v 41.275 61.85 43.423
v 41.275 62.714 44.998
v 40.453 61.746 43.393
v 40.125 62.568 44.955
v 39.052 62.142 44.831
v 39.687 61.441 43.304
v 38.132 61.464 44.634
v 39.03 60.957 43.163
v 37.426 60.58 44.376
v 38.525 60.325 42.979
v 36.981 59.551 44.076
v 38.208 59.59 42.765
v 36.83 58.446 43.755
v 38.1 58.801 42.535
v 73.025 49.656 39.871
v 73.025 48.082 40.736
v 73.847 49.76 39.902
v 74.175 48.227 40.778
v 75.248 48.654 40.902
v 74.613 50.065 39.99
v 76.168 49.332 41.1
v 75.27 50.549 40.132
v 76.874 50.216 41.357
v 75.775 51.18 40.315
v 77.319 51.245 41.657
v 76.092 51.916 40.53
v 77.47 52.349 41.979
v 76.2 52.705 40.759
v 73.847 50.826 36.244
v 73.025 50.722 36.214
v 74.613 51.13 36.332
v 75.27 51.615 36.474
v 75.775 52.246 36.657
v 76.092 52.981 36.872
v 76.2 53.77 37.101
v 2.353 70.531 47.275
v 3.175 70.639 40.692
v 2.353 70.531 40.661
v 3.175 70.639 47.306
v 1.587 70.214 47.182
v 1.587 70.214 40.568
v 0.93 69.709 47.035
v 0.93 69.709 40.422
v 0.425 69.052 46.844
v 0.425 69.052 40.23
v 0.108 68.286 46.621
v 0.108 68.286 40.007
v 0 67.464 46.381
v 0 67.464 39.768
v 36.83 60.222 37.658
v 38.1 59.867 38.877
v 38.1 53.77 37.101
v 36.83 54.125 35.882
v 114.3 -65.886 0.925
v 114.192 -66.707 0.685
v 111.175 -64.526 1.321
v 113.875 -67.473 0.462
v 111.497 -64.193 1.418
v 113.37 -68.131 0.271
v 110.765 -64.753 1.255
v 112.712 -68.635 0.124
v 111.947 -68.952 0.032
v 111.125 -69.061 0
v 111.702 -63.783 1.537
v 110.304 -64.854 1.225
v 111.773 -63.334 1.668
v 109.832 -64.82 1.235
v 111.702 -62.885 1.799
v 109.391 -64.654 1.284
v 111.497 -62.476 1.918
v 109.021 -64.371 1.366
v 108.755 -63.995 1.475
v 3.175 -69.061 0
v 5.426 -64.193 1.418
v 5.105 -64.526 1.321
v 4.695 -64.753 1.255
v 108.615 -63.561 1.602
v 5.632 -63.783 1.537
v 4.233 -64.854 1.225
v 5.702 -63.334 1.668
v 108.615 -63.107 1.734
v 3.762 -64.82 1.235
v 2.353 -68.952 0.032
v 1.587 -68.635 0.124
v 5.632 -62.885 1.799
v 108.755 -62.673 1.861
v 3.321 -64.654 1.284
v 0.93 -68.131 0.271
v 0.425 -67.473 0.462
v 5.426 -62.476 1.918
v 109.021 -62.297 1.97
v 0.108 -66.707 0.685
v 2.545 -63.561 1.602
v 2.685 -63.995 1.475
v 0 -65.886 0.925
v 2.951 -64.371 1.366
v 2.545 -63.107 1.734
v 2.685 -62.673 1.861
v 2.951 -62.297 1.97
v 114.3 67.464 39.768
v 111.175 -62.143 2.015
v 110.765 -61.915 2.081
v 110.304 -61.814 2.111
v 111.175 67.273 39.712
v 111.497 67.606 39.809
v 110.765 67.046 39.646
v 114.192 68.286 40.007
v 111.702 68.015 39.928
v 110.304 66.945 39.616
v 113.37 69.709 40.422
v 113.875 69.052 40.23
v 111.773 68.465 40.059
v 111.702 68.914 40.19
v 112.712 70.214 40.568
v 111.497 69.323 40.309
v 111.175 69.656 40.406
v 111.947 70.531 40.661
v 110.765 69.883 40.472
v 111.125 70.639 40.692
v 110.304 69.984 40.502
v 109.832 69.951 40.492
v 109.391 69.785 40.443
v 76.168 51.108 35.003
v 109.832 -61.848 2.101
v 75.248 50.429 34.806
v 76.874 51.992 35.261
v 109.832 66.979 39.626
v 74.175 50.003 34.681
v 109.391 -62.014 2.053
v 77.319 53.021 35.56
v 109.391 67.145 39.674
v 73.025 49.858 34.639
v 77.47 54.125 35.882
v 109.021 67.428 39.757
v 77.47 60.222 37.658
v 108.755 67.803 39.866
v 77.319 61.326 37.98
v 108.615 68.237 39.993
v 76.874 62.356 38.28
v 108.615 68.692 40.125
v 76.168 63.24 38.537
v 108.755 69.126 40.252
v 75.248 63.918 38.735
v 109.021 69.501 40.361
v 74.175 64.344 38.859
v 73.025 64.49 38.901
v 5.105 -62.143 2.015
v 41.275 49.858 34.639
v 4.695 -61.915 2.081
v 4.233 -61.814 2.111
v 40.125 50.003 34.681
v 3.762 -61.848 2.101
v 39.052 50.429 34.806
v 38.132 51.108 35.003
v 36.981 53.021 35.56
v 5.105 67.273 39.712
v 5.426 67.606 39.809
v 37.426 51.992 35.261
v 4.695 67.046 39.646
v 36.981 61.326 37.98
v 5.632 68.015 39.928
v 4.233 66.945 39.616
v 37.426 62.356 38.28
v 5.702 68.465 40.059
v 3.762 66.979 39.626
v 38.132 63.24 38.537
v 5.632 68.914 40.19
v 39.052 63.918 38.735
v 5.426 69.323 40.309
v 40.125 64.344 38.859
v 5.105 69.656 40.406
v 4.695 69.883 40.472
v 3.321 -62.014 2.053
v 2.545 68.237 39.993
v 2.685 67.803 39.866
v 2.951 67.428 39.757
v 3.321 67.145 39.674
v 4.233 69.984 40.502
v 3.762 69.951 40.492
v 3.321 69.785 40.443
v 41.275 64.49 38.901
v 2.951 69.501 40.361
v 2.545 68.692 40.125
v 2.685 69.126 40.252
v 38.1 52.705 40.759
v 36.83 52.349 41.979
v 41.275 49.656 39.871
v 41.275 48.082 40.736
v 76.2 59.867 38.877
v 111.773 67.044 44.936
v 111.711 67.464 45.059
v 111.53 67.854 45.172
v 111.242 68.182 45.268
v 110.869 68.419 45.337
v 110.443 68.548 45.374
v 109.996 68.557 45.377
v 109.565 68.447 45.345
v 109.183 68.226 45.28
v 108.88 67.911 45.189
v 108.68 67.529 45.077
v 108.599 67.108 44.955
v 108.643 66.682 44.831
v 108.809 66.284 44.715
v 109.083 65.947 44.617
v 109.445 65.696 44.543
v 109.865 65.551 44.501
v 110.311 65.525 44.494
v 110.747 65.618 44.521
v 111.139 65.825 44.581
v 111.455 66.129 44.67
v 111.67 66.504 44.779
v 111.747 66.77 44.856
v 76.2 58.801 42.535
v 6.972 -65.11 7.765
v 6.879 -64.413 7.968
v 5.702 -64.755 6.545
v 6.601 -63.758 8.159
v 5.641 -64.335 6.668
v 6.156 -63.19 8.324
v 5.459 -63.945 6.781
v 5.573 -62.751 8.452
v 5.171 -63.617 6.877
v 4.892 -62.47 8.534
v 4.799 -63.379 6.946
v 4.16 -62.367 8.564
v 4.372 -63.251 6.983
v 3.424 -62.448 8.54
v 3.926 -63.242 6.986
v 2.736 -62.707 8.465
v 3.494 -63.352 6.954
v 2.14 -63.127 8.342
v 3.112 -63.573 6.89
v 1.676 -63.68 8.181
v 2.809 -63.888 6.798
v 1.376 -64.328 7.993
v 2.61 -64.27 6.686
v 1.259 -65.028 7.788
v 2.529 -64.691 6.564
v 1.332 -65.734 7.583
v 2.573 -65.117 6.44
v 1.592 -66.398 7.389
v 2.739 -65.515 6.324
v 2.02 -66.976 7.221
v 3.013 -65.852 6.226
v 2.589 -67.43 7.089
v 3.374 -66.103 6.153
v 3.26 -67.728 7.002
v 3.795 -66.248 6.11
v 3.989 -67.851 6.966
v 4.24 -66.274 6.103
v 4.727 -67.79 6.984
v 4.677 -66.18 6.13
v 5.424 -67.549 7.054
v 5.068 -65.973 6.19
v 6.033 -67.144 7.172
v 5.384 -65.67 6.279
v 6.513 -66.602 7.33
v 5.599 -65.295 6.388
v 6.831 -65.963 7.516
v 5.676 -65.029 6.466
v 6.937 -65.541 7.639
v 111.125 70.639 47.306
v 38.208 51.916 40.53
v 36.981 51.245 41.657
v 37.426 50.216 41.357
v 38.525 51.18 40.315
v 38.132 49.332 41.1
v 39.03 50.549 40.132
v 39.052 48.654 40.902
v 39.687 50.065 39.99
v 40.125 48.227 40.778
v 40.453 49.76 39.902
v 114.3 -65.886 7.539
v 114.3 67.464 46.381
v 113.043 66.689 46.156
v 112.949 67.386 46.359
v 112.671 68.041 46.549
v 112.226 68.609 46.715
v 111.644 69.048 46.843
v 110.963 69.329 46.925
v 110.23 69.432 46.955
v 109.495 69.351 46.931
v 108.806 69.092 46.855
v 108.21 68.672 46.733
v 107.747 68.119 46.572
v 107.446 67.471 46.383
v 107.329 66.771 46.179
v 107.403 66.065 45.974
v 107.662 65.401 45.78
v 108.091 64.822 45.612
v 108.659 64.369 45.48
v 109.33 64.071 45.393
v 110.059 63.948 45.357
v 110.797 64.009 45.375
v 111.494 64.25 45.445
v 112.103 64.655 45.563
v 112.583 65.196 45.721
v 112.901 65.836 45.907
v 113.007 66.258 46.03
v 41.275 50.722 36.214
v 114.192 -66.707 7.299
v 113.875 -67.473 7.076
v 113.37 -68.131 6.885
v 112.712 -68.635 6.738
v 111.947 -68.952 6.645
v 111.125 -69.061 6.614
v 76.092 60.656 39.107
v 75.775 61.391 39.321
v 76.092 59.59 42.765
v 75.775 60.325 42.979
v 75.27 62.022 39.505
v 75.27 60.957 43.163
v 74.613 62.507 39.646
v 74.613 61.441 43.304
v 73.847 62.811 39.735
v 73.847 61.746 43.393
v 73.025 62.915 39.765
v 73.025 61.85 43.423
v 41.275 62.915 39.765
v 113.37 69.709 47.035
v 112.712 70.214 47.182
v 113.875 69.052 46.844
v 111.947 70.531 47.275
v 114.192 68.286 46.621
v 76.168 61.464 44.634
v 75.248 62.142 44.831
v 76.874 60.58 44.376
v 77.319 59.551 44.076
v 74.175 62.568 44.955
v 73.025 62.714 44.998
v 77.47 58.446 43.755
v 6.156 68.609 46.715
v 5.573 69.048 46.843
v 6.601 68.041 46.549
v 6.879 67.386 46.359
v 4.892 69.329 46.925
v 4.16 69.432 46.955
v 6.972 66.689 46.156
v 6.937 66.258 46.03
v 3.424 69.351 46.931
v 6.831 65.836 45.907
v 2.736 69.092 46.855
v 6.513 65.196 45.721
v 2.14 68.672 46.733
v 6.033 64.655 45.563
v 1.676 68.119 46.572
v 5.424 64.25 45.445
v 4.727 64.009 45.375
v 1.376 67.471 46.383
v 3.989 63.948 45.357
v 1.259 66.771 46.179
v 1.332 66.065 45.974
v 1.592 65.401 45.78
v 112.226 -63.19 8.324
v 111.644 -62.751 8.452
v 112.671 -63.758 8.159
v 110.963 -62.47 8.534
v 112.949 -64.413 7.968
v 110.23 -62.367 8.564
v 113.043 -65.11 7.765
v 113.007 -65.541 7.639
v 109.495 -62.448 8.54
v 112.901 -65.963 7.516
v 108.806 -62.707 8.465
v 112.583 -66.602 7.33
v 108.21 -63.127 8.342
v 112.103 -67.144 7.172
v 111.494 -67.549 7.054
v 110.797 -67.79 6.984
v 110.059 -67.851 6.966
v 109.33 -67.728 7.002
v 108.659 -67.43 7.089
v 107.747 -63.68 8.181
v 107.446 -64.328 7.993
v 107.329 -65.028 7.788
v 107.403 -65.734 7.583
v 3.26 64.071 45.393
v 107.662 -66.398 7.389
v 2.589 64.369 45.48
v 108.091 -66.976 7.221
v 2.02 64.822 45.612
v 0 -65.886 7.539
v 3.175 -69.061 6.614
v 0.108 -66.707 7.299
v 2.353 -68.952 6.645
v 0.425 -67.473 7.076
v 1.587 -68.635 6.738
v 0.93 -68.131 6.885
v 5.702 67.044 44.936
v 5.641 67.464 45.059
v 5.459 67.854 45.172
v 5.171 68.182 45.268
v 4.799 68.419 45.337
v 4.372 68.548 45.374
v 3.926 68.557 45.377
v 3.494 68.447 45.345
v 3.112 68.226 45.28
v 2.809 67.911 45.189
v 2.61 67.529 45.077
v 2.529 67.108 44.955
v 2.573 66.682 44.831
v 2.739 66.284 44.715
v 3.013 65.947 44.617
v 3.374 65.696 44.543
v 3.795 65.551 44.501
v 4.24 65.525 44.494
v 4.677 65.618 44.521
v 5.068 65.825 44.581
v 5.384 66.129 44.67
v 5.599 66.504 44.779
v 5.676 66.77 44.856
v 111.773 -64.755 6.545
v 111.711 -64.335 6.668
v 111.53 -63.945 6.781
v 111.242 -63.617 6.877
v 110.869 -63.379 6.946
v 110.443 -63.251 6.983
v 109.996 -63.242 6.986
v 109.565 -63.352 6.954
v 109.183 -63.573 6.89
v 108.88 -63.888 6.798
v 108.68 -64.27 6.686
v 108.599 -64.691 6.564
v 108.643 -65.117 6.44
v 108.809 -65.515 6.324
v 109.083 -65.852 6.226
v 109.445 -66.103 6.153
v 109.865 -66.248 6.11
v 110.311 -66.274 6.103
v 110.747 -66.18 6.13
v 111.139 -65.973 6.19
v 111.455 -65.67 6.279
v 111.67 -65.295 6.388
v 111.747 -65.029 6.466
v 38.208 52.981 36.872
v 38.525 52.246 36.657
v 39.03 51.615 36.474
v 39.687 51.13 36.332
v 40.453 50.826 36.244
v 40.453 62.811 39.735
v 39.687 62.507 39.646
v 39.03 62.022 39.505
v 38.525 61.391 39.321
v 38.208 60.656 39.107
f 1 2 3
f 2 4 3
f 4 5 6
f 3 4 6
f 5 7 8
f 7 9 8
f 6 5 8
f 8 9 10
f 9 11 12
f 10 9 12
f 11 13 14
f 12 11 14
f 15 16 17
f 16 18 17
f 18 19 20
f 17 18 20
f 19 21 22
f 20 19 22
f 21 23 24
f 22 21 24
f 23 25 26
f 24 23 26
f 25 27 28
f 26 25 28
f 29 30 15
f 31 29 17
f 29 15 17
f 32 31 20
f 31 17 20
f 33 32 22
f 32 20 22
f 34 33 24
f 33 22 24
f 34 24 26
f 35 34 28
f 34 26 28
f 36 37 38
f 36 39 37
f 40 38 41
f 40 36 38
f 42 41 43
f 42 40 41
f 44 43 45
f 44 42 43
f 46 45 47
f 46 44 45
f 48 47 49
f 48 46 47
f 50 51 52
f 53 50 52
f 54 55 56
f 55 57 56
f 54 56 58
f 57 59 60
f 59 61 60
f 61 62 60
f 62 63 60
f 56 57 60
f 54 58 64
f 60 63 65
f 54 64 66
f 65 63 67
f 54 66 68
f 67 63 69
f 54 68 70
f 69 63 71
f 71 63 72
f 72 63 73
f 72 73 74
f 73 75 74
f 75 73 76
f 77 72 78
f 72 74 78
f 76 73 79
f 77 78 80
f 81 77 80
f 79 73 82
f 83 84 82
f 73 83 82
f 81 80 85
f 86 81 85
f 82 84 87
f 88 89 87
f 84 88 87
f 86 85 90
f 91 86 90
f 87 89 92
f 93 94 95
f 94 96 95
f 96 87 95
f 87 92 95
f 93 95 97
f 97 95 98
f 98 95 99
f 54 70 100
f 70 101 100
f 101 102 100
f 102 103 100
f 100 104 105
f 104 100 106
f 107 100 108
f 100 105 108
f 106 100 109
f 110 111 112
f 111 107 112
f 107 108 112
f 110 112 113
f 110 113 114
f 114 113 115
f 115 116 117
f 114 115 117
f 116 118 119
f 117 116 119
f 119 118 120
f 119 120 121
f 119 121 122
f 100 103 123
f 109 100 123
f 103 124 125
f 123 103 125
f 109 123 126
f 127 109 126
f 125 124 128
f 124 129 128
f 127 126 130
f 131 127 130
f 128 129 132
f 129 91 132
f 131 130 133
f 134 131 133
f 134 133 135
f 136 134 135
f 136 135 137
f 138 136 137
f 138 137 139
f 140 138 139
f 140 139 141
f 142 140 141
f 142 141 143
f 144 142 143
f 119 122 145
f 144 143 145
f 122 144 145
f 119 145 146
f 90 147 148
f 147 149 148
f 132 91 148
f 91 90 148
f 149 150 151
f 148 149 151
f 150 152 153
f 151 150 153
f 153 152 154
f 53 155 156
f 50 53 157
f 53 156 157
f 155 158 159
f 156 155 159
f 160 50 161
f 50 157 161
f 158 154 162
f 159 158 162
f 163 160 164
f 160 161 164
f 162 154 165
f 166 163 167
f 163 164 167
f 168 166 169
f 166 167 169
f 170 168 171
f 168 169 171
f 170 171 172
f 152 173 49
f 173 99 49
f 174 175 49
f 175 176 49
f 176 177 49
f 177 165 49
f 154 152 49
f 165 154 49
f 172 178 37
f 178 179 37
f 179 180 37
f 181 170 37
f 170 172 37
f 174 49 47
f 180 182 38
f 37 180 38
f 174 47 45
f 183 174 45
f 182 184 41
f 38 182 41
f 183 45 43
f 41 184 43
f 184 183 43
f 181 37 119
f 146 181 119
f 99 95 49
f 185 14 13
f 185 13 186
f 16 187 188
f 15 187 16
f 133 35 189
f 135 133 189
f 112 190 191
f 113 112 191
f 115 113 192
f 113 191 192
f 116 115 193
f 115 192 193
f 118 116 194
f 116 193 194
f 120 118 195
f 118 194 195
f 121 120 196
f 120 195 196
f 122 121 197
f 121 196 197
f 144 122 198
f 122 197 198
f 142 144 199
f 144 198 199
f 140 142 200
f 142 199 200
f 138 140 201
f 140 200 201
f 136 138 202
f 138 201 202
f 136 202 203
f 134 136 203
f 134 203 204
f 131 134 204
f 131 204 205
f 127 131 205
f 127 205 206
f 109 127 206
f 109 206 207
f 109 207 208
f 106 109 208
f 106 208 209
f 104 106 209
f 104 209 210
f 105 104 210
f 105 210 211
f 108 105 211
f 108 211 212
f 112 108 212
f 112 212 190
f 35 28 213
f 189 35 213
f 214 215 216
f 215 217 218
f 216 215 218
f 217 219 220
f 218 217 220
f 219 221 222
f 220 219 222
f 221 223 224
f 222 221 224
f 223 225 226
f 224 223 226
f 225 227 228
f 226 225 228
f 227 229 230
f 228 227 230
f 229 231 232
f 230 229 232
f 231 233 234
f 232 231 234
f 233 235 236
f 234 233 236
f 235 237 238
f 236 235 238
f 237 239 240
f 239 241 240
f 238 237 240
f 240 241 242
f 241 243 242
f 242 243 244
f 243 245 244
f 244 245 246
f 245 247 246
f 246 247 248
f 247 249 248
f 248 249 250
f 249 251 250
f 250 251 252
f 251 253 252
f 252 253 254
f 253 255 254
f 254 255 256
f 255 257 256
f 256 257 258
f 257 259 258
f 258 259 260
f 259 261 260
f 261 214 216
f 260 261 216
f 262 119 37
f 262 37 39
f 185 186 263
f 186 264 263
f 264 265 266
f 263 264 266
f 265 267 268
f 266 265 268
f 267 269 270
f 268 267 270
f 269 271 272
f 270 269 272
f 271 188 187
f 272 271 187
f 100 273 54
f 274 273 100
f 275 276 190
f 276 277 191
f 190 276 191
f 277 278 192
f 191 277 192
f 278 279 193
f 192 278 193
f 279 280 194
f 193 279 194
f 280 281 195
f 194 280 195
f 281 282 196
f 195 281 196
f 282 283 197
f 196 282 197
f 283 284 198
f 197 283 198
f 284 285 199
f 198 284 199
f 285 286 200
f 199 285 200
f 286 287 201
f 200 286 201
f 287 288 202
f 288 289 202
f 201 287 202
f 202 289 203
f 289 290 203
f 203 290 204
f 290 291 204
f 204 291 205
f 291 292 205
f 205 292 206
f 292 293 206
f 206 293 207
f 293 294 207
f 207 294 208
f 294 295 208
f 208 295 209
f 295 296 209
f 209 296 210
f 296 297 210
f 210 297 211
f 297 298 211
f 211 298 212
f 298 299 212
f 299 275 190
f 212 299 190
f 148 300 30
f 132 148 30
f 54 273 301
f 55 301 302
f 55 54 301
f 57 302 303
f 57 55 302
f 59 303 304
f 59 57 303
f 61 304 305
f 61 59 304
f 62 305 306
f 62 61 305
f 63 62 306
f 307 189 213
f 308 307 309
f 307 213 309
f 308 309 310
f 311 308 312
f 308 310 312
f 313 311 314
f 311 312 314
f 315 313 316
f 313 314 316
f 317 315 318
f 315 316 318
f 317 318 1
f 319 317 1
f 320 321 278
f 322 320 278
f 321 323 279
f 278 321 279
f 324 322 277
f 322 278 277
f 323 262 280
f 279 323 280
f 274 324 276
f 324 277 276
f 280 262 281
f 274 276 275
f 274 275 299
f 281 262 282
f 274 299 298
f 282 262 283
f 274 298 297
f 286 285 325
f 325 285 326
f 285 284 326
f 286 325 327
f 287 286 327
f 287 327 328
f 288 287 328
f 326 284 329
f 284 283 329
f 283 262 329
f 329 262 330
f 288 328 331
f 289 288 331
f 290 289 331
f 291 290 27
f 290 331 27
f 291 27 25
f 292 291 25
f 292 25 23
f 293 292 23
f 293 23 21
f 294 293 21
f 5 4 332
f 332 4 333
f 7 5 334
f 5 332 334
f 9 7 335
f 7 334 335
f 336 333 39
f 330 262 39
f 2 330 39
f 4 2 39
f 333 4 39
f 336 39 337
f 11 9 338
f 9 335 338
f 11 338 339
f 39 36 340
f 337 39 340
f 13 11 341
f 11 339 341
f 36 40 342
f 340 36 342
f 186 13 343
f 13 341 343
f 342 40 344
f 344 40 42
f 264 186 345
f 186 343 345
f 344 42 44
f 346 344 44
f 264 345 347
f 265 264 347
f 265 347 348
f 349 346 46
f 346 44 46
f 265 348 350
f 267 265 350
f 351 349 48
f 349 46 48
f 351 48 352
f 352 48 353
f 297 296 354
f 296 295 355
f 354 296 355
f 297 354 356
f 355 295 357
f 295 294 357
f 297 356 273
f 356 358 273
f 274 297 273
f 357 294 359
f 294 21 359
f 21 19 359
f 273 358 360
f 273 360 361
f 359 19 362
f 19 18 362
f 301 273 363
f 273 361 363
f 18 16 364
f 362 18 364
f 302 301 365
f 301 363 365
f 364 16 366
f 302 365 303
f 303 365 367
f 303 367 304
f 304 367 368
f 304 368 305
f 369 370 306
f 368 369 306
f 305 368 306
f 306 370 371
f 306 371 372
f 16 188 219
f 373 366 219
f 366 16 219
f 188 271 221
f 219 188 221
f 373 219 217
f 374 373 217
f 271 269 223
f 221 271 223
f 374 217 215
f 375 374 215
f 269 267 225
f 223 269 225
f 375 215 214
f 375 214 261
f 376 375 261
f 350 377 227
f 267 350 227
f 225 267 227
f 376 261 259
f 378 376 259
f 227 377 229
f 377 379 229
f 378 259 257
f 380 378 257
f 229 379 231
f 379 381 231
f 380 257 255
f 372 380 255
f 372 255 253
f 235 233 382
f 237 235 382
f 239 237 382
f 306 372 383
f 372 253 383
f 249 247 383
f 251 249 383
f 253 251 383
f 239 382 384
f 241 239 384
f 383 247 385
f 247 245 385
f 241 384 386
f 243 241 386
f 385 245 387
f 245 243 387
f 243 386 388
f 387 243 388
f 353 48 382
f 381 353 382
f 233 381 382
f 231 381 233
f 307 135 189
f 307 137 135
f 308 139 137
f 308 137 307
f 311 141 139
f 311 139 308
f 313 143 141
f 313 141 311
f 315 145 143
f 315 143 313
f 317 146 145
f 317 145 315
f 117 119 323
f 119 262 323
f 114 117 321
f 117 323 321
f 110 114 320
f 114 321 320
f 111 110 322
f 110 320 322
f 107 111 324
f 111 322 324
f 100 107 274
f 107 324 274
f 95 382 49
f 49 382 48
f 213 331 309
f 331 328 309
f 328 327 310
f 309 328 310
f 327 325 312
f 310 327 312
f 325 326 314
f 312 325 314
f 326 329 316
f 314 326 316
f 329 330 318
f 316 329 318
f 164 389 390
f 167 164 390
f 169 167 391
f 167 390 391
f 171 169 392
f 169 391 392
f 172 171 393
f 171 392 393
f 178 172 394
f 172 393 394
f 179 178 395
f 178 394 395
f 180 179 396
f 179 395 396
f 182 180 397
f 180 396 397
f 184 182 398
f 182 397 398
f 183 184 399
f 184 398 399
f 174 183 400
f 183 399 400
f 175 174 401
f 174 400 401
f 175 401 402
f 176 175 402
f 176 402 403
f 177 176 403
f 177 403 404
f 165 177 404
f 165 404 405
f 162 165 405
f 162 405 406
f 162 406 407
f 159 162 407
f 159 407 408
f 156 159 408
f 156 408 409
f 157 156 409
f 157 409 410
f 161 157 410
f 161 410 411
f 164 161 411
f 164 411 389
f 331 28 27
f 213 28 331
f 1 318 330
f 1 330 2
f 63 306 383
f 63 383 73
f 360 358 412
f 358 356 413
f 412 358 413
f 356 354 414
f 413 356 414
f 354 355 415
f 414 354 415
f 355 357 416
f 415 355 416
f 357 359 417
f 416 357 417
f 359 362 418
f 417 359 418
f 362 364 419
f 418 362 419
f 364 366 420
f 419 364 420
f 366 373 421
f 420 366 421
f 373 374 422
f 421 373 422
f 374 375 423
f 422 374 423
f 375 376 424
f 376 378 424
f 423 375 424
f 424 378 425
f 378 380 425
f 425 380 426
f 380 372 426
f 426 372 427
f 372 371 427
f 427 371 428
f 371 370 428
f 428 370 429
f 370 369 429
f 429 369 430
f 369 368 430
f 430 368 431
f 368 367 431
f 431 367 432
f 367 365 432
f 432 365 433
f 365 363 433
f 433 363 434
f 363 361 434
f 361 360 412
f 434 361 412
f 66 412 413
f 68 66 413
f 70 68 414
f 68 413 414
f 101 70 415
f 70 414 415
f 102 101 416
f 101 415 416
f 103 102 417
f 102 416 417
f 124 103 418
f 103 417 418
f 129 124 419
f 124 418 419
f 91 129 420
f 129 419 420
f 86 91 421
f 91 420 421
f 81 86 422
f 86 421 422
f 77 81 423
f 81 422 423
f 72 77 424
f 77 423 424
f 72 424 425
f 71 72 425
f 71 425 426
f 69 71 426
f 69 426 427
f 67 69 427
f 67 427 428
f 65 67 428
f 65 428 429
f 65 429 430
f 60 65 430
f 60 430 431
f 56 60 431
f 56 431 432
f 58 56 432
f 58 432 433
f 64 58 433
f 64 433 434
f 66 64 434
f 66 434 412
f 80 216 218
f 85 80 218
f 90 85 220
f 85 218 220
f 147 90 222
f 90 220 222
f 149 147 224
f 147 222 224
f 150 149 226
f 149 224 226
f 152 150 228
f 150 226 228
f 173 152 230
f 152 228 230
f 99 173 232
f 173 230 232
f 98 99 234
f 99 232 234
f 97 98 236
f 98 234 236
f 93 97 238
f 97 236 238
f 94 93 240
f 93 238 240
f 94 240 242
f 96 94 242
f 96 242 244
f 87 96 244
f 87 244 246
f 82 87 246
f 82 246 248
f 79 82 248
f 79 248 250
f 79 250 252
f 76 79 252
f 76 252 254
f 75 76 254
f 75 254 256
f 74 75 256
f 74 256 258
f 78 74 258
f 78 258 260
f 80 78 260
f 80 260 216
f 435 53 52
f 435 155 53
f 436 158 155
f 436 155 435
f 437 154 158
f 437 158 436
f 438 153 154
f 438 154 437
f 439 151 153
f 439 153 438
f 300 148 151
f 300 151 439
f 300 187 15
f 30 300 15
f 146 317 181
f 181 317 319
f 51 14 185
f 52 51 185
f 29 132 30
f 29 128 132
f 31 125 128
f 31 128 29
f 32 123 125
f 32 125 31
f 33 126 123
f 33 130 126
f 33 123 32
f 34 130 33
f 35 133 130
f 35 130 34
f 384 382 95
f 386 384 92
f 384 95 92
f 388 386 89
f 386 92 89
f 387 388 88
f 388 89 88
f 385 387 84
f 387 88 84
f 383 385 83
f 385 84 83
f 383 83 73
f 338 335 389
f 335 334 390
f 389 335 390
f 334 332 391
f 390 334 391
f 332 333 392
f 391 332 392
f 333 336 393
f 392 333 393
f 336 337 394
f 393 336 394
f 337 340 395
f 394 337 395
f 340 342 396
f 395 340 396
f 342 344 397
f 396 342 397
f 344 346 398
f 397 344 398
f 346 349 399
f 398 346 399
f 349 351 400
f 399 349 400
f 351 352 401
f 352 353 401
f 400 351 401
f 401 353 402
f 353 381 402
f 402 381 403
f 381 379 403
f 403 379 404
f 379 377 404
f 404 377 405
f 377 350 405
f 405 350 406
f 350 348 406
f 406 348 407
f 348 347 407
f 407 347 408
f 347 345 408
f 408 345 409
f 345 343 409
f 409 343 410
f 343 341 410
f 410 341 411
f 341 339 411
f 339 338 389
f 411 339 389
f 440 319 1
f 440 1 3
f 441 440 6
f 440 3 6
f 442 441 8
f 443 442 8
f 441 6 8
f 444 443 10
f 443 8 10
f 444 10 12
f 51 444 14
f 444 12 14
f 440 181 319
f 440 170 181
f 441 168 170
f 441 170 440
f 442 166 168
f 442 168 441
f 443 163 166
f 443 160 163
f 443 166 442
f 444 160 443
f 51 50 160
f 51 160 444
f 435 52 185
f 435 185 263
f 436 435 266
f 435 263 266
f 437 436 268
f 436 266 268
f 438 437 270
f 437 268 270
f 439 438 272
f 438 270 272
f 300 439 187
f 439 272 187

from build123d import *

# Parameters (mm, degrees)
F1_DEPTH = 114.3
F2_R     = 1.5875
F3_DEPTH = 25.4
F4_SIZE  = 1.27
F5_R     = 3.175


with BuildPart() as f1:
    # F0 (on Right) → F1 (new body)
    with BuildSketch(Plane.YZ):
        Polygon((-69.0606392323, 6.6139034851), (-69.0606392323, 0), (70.6393607677, 40.6923843751), (70.6393607677, 47.3062878602), align=None)
    extrude(amount=F1_DEPTH)

    # F2 (on face) → F3 (cut)
    with BuildSketch(Plane(origin=(0, -7.177119146, 24.6395869914), x_dir=(1, 0, 0), z_dir=(0, -0.2796614495, 0.9600986791))):
        with BuildLine():
            Line((73.025, 71.525502), (41.275, 71.525502))
            ThreePointArc((41.275, 71.525502), (39.0299359698, 70.5955660302), (38.1, 68.350502))
            Line((38.1, 68.350502), (38.1, 62.000502))
            ThreePointArc((38.1, 62.000502), (39.0299359697, 59.7554379697), (41.275, 58.825502))
            Line((41.275, 58.825502), (73.025, 58.825502))
            ThreePointArc((73.025, 58.825502), (75.2700640303, 59.7554379697), (76.2, 62.000502))
            Line((76.2, 62.000502), (76.2, 68.350502))
            ThreePointArc((76.2, 68.350502), (75.2700640302, 70.5955660302), (73.025, 71.525502))
        make_face()
        with Locations((4.1148, 76.935702)):
            Circle(F2_R)
        with Locations((110.1852, 76.935702)):
            Circle(F2_R)
        with Locations((110.1852, -60.3405746722)):
            Circle(F2_R)
        with Locations((4.1148, -60.3405746722)):
            Circle(F2_R)
    extrude(amount=-F3_DEPTH, mode=Mode.SUBTRACT)

    # F4
    f4_edges = [f1.edges().sort_by_distance(p)[0] for p in [
        (108.5977, 66.688747, 46.155537),
        (108.5977, -65.110025, 7.764654),
        (2.5273, -65.110025, 7.764654),
        (2.5273, 66.688747, 46.155537),
        (57.15, 61.494421, 44.642513),
        (39.029936, 60.601591, 44.382445),
        (38.1, 55.397794, 42.866662),
        (39.029936, 50.193998, 41.350879),
        (57.15, 49.301168, 41.090812),
        (75.270064, 50.193998, 41.350879),
        (76.2, 55.397794, 42.866662),
        (75.270064, 60.601591, 44.382445),
        (57.15, 51.077018, 34.994186),
        (75.270064, 51.969848, 35.254253),
    ]]
    chamfer(f4_edges, length=F4_SIZE)

    # F5
    f5_edges = [f1.edges().sort_by_distance(p)[0] for p in [
        (114.3, -69.060639, 3.306952),
        (114.3, 70.639361, 43.999336),
        (0, -69.060639, 3.306952),
        (0, 70.639361, 43.999336),
    ]]
    fillet(f5_edges, radius=F5_R)


solid = f1.part
